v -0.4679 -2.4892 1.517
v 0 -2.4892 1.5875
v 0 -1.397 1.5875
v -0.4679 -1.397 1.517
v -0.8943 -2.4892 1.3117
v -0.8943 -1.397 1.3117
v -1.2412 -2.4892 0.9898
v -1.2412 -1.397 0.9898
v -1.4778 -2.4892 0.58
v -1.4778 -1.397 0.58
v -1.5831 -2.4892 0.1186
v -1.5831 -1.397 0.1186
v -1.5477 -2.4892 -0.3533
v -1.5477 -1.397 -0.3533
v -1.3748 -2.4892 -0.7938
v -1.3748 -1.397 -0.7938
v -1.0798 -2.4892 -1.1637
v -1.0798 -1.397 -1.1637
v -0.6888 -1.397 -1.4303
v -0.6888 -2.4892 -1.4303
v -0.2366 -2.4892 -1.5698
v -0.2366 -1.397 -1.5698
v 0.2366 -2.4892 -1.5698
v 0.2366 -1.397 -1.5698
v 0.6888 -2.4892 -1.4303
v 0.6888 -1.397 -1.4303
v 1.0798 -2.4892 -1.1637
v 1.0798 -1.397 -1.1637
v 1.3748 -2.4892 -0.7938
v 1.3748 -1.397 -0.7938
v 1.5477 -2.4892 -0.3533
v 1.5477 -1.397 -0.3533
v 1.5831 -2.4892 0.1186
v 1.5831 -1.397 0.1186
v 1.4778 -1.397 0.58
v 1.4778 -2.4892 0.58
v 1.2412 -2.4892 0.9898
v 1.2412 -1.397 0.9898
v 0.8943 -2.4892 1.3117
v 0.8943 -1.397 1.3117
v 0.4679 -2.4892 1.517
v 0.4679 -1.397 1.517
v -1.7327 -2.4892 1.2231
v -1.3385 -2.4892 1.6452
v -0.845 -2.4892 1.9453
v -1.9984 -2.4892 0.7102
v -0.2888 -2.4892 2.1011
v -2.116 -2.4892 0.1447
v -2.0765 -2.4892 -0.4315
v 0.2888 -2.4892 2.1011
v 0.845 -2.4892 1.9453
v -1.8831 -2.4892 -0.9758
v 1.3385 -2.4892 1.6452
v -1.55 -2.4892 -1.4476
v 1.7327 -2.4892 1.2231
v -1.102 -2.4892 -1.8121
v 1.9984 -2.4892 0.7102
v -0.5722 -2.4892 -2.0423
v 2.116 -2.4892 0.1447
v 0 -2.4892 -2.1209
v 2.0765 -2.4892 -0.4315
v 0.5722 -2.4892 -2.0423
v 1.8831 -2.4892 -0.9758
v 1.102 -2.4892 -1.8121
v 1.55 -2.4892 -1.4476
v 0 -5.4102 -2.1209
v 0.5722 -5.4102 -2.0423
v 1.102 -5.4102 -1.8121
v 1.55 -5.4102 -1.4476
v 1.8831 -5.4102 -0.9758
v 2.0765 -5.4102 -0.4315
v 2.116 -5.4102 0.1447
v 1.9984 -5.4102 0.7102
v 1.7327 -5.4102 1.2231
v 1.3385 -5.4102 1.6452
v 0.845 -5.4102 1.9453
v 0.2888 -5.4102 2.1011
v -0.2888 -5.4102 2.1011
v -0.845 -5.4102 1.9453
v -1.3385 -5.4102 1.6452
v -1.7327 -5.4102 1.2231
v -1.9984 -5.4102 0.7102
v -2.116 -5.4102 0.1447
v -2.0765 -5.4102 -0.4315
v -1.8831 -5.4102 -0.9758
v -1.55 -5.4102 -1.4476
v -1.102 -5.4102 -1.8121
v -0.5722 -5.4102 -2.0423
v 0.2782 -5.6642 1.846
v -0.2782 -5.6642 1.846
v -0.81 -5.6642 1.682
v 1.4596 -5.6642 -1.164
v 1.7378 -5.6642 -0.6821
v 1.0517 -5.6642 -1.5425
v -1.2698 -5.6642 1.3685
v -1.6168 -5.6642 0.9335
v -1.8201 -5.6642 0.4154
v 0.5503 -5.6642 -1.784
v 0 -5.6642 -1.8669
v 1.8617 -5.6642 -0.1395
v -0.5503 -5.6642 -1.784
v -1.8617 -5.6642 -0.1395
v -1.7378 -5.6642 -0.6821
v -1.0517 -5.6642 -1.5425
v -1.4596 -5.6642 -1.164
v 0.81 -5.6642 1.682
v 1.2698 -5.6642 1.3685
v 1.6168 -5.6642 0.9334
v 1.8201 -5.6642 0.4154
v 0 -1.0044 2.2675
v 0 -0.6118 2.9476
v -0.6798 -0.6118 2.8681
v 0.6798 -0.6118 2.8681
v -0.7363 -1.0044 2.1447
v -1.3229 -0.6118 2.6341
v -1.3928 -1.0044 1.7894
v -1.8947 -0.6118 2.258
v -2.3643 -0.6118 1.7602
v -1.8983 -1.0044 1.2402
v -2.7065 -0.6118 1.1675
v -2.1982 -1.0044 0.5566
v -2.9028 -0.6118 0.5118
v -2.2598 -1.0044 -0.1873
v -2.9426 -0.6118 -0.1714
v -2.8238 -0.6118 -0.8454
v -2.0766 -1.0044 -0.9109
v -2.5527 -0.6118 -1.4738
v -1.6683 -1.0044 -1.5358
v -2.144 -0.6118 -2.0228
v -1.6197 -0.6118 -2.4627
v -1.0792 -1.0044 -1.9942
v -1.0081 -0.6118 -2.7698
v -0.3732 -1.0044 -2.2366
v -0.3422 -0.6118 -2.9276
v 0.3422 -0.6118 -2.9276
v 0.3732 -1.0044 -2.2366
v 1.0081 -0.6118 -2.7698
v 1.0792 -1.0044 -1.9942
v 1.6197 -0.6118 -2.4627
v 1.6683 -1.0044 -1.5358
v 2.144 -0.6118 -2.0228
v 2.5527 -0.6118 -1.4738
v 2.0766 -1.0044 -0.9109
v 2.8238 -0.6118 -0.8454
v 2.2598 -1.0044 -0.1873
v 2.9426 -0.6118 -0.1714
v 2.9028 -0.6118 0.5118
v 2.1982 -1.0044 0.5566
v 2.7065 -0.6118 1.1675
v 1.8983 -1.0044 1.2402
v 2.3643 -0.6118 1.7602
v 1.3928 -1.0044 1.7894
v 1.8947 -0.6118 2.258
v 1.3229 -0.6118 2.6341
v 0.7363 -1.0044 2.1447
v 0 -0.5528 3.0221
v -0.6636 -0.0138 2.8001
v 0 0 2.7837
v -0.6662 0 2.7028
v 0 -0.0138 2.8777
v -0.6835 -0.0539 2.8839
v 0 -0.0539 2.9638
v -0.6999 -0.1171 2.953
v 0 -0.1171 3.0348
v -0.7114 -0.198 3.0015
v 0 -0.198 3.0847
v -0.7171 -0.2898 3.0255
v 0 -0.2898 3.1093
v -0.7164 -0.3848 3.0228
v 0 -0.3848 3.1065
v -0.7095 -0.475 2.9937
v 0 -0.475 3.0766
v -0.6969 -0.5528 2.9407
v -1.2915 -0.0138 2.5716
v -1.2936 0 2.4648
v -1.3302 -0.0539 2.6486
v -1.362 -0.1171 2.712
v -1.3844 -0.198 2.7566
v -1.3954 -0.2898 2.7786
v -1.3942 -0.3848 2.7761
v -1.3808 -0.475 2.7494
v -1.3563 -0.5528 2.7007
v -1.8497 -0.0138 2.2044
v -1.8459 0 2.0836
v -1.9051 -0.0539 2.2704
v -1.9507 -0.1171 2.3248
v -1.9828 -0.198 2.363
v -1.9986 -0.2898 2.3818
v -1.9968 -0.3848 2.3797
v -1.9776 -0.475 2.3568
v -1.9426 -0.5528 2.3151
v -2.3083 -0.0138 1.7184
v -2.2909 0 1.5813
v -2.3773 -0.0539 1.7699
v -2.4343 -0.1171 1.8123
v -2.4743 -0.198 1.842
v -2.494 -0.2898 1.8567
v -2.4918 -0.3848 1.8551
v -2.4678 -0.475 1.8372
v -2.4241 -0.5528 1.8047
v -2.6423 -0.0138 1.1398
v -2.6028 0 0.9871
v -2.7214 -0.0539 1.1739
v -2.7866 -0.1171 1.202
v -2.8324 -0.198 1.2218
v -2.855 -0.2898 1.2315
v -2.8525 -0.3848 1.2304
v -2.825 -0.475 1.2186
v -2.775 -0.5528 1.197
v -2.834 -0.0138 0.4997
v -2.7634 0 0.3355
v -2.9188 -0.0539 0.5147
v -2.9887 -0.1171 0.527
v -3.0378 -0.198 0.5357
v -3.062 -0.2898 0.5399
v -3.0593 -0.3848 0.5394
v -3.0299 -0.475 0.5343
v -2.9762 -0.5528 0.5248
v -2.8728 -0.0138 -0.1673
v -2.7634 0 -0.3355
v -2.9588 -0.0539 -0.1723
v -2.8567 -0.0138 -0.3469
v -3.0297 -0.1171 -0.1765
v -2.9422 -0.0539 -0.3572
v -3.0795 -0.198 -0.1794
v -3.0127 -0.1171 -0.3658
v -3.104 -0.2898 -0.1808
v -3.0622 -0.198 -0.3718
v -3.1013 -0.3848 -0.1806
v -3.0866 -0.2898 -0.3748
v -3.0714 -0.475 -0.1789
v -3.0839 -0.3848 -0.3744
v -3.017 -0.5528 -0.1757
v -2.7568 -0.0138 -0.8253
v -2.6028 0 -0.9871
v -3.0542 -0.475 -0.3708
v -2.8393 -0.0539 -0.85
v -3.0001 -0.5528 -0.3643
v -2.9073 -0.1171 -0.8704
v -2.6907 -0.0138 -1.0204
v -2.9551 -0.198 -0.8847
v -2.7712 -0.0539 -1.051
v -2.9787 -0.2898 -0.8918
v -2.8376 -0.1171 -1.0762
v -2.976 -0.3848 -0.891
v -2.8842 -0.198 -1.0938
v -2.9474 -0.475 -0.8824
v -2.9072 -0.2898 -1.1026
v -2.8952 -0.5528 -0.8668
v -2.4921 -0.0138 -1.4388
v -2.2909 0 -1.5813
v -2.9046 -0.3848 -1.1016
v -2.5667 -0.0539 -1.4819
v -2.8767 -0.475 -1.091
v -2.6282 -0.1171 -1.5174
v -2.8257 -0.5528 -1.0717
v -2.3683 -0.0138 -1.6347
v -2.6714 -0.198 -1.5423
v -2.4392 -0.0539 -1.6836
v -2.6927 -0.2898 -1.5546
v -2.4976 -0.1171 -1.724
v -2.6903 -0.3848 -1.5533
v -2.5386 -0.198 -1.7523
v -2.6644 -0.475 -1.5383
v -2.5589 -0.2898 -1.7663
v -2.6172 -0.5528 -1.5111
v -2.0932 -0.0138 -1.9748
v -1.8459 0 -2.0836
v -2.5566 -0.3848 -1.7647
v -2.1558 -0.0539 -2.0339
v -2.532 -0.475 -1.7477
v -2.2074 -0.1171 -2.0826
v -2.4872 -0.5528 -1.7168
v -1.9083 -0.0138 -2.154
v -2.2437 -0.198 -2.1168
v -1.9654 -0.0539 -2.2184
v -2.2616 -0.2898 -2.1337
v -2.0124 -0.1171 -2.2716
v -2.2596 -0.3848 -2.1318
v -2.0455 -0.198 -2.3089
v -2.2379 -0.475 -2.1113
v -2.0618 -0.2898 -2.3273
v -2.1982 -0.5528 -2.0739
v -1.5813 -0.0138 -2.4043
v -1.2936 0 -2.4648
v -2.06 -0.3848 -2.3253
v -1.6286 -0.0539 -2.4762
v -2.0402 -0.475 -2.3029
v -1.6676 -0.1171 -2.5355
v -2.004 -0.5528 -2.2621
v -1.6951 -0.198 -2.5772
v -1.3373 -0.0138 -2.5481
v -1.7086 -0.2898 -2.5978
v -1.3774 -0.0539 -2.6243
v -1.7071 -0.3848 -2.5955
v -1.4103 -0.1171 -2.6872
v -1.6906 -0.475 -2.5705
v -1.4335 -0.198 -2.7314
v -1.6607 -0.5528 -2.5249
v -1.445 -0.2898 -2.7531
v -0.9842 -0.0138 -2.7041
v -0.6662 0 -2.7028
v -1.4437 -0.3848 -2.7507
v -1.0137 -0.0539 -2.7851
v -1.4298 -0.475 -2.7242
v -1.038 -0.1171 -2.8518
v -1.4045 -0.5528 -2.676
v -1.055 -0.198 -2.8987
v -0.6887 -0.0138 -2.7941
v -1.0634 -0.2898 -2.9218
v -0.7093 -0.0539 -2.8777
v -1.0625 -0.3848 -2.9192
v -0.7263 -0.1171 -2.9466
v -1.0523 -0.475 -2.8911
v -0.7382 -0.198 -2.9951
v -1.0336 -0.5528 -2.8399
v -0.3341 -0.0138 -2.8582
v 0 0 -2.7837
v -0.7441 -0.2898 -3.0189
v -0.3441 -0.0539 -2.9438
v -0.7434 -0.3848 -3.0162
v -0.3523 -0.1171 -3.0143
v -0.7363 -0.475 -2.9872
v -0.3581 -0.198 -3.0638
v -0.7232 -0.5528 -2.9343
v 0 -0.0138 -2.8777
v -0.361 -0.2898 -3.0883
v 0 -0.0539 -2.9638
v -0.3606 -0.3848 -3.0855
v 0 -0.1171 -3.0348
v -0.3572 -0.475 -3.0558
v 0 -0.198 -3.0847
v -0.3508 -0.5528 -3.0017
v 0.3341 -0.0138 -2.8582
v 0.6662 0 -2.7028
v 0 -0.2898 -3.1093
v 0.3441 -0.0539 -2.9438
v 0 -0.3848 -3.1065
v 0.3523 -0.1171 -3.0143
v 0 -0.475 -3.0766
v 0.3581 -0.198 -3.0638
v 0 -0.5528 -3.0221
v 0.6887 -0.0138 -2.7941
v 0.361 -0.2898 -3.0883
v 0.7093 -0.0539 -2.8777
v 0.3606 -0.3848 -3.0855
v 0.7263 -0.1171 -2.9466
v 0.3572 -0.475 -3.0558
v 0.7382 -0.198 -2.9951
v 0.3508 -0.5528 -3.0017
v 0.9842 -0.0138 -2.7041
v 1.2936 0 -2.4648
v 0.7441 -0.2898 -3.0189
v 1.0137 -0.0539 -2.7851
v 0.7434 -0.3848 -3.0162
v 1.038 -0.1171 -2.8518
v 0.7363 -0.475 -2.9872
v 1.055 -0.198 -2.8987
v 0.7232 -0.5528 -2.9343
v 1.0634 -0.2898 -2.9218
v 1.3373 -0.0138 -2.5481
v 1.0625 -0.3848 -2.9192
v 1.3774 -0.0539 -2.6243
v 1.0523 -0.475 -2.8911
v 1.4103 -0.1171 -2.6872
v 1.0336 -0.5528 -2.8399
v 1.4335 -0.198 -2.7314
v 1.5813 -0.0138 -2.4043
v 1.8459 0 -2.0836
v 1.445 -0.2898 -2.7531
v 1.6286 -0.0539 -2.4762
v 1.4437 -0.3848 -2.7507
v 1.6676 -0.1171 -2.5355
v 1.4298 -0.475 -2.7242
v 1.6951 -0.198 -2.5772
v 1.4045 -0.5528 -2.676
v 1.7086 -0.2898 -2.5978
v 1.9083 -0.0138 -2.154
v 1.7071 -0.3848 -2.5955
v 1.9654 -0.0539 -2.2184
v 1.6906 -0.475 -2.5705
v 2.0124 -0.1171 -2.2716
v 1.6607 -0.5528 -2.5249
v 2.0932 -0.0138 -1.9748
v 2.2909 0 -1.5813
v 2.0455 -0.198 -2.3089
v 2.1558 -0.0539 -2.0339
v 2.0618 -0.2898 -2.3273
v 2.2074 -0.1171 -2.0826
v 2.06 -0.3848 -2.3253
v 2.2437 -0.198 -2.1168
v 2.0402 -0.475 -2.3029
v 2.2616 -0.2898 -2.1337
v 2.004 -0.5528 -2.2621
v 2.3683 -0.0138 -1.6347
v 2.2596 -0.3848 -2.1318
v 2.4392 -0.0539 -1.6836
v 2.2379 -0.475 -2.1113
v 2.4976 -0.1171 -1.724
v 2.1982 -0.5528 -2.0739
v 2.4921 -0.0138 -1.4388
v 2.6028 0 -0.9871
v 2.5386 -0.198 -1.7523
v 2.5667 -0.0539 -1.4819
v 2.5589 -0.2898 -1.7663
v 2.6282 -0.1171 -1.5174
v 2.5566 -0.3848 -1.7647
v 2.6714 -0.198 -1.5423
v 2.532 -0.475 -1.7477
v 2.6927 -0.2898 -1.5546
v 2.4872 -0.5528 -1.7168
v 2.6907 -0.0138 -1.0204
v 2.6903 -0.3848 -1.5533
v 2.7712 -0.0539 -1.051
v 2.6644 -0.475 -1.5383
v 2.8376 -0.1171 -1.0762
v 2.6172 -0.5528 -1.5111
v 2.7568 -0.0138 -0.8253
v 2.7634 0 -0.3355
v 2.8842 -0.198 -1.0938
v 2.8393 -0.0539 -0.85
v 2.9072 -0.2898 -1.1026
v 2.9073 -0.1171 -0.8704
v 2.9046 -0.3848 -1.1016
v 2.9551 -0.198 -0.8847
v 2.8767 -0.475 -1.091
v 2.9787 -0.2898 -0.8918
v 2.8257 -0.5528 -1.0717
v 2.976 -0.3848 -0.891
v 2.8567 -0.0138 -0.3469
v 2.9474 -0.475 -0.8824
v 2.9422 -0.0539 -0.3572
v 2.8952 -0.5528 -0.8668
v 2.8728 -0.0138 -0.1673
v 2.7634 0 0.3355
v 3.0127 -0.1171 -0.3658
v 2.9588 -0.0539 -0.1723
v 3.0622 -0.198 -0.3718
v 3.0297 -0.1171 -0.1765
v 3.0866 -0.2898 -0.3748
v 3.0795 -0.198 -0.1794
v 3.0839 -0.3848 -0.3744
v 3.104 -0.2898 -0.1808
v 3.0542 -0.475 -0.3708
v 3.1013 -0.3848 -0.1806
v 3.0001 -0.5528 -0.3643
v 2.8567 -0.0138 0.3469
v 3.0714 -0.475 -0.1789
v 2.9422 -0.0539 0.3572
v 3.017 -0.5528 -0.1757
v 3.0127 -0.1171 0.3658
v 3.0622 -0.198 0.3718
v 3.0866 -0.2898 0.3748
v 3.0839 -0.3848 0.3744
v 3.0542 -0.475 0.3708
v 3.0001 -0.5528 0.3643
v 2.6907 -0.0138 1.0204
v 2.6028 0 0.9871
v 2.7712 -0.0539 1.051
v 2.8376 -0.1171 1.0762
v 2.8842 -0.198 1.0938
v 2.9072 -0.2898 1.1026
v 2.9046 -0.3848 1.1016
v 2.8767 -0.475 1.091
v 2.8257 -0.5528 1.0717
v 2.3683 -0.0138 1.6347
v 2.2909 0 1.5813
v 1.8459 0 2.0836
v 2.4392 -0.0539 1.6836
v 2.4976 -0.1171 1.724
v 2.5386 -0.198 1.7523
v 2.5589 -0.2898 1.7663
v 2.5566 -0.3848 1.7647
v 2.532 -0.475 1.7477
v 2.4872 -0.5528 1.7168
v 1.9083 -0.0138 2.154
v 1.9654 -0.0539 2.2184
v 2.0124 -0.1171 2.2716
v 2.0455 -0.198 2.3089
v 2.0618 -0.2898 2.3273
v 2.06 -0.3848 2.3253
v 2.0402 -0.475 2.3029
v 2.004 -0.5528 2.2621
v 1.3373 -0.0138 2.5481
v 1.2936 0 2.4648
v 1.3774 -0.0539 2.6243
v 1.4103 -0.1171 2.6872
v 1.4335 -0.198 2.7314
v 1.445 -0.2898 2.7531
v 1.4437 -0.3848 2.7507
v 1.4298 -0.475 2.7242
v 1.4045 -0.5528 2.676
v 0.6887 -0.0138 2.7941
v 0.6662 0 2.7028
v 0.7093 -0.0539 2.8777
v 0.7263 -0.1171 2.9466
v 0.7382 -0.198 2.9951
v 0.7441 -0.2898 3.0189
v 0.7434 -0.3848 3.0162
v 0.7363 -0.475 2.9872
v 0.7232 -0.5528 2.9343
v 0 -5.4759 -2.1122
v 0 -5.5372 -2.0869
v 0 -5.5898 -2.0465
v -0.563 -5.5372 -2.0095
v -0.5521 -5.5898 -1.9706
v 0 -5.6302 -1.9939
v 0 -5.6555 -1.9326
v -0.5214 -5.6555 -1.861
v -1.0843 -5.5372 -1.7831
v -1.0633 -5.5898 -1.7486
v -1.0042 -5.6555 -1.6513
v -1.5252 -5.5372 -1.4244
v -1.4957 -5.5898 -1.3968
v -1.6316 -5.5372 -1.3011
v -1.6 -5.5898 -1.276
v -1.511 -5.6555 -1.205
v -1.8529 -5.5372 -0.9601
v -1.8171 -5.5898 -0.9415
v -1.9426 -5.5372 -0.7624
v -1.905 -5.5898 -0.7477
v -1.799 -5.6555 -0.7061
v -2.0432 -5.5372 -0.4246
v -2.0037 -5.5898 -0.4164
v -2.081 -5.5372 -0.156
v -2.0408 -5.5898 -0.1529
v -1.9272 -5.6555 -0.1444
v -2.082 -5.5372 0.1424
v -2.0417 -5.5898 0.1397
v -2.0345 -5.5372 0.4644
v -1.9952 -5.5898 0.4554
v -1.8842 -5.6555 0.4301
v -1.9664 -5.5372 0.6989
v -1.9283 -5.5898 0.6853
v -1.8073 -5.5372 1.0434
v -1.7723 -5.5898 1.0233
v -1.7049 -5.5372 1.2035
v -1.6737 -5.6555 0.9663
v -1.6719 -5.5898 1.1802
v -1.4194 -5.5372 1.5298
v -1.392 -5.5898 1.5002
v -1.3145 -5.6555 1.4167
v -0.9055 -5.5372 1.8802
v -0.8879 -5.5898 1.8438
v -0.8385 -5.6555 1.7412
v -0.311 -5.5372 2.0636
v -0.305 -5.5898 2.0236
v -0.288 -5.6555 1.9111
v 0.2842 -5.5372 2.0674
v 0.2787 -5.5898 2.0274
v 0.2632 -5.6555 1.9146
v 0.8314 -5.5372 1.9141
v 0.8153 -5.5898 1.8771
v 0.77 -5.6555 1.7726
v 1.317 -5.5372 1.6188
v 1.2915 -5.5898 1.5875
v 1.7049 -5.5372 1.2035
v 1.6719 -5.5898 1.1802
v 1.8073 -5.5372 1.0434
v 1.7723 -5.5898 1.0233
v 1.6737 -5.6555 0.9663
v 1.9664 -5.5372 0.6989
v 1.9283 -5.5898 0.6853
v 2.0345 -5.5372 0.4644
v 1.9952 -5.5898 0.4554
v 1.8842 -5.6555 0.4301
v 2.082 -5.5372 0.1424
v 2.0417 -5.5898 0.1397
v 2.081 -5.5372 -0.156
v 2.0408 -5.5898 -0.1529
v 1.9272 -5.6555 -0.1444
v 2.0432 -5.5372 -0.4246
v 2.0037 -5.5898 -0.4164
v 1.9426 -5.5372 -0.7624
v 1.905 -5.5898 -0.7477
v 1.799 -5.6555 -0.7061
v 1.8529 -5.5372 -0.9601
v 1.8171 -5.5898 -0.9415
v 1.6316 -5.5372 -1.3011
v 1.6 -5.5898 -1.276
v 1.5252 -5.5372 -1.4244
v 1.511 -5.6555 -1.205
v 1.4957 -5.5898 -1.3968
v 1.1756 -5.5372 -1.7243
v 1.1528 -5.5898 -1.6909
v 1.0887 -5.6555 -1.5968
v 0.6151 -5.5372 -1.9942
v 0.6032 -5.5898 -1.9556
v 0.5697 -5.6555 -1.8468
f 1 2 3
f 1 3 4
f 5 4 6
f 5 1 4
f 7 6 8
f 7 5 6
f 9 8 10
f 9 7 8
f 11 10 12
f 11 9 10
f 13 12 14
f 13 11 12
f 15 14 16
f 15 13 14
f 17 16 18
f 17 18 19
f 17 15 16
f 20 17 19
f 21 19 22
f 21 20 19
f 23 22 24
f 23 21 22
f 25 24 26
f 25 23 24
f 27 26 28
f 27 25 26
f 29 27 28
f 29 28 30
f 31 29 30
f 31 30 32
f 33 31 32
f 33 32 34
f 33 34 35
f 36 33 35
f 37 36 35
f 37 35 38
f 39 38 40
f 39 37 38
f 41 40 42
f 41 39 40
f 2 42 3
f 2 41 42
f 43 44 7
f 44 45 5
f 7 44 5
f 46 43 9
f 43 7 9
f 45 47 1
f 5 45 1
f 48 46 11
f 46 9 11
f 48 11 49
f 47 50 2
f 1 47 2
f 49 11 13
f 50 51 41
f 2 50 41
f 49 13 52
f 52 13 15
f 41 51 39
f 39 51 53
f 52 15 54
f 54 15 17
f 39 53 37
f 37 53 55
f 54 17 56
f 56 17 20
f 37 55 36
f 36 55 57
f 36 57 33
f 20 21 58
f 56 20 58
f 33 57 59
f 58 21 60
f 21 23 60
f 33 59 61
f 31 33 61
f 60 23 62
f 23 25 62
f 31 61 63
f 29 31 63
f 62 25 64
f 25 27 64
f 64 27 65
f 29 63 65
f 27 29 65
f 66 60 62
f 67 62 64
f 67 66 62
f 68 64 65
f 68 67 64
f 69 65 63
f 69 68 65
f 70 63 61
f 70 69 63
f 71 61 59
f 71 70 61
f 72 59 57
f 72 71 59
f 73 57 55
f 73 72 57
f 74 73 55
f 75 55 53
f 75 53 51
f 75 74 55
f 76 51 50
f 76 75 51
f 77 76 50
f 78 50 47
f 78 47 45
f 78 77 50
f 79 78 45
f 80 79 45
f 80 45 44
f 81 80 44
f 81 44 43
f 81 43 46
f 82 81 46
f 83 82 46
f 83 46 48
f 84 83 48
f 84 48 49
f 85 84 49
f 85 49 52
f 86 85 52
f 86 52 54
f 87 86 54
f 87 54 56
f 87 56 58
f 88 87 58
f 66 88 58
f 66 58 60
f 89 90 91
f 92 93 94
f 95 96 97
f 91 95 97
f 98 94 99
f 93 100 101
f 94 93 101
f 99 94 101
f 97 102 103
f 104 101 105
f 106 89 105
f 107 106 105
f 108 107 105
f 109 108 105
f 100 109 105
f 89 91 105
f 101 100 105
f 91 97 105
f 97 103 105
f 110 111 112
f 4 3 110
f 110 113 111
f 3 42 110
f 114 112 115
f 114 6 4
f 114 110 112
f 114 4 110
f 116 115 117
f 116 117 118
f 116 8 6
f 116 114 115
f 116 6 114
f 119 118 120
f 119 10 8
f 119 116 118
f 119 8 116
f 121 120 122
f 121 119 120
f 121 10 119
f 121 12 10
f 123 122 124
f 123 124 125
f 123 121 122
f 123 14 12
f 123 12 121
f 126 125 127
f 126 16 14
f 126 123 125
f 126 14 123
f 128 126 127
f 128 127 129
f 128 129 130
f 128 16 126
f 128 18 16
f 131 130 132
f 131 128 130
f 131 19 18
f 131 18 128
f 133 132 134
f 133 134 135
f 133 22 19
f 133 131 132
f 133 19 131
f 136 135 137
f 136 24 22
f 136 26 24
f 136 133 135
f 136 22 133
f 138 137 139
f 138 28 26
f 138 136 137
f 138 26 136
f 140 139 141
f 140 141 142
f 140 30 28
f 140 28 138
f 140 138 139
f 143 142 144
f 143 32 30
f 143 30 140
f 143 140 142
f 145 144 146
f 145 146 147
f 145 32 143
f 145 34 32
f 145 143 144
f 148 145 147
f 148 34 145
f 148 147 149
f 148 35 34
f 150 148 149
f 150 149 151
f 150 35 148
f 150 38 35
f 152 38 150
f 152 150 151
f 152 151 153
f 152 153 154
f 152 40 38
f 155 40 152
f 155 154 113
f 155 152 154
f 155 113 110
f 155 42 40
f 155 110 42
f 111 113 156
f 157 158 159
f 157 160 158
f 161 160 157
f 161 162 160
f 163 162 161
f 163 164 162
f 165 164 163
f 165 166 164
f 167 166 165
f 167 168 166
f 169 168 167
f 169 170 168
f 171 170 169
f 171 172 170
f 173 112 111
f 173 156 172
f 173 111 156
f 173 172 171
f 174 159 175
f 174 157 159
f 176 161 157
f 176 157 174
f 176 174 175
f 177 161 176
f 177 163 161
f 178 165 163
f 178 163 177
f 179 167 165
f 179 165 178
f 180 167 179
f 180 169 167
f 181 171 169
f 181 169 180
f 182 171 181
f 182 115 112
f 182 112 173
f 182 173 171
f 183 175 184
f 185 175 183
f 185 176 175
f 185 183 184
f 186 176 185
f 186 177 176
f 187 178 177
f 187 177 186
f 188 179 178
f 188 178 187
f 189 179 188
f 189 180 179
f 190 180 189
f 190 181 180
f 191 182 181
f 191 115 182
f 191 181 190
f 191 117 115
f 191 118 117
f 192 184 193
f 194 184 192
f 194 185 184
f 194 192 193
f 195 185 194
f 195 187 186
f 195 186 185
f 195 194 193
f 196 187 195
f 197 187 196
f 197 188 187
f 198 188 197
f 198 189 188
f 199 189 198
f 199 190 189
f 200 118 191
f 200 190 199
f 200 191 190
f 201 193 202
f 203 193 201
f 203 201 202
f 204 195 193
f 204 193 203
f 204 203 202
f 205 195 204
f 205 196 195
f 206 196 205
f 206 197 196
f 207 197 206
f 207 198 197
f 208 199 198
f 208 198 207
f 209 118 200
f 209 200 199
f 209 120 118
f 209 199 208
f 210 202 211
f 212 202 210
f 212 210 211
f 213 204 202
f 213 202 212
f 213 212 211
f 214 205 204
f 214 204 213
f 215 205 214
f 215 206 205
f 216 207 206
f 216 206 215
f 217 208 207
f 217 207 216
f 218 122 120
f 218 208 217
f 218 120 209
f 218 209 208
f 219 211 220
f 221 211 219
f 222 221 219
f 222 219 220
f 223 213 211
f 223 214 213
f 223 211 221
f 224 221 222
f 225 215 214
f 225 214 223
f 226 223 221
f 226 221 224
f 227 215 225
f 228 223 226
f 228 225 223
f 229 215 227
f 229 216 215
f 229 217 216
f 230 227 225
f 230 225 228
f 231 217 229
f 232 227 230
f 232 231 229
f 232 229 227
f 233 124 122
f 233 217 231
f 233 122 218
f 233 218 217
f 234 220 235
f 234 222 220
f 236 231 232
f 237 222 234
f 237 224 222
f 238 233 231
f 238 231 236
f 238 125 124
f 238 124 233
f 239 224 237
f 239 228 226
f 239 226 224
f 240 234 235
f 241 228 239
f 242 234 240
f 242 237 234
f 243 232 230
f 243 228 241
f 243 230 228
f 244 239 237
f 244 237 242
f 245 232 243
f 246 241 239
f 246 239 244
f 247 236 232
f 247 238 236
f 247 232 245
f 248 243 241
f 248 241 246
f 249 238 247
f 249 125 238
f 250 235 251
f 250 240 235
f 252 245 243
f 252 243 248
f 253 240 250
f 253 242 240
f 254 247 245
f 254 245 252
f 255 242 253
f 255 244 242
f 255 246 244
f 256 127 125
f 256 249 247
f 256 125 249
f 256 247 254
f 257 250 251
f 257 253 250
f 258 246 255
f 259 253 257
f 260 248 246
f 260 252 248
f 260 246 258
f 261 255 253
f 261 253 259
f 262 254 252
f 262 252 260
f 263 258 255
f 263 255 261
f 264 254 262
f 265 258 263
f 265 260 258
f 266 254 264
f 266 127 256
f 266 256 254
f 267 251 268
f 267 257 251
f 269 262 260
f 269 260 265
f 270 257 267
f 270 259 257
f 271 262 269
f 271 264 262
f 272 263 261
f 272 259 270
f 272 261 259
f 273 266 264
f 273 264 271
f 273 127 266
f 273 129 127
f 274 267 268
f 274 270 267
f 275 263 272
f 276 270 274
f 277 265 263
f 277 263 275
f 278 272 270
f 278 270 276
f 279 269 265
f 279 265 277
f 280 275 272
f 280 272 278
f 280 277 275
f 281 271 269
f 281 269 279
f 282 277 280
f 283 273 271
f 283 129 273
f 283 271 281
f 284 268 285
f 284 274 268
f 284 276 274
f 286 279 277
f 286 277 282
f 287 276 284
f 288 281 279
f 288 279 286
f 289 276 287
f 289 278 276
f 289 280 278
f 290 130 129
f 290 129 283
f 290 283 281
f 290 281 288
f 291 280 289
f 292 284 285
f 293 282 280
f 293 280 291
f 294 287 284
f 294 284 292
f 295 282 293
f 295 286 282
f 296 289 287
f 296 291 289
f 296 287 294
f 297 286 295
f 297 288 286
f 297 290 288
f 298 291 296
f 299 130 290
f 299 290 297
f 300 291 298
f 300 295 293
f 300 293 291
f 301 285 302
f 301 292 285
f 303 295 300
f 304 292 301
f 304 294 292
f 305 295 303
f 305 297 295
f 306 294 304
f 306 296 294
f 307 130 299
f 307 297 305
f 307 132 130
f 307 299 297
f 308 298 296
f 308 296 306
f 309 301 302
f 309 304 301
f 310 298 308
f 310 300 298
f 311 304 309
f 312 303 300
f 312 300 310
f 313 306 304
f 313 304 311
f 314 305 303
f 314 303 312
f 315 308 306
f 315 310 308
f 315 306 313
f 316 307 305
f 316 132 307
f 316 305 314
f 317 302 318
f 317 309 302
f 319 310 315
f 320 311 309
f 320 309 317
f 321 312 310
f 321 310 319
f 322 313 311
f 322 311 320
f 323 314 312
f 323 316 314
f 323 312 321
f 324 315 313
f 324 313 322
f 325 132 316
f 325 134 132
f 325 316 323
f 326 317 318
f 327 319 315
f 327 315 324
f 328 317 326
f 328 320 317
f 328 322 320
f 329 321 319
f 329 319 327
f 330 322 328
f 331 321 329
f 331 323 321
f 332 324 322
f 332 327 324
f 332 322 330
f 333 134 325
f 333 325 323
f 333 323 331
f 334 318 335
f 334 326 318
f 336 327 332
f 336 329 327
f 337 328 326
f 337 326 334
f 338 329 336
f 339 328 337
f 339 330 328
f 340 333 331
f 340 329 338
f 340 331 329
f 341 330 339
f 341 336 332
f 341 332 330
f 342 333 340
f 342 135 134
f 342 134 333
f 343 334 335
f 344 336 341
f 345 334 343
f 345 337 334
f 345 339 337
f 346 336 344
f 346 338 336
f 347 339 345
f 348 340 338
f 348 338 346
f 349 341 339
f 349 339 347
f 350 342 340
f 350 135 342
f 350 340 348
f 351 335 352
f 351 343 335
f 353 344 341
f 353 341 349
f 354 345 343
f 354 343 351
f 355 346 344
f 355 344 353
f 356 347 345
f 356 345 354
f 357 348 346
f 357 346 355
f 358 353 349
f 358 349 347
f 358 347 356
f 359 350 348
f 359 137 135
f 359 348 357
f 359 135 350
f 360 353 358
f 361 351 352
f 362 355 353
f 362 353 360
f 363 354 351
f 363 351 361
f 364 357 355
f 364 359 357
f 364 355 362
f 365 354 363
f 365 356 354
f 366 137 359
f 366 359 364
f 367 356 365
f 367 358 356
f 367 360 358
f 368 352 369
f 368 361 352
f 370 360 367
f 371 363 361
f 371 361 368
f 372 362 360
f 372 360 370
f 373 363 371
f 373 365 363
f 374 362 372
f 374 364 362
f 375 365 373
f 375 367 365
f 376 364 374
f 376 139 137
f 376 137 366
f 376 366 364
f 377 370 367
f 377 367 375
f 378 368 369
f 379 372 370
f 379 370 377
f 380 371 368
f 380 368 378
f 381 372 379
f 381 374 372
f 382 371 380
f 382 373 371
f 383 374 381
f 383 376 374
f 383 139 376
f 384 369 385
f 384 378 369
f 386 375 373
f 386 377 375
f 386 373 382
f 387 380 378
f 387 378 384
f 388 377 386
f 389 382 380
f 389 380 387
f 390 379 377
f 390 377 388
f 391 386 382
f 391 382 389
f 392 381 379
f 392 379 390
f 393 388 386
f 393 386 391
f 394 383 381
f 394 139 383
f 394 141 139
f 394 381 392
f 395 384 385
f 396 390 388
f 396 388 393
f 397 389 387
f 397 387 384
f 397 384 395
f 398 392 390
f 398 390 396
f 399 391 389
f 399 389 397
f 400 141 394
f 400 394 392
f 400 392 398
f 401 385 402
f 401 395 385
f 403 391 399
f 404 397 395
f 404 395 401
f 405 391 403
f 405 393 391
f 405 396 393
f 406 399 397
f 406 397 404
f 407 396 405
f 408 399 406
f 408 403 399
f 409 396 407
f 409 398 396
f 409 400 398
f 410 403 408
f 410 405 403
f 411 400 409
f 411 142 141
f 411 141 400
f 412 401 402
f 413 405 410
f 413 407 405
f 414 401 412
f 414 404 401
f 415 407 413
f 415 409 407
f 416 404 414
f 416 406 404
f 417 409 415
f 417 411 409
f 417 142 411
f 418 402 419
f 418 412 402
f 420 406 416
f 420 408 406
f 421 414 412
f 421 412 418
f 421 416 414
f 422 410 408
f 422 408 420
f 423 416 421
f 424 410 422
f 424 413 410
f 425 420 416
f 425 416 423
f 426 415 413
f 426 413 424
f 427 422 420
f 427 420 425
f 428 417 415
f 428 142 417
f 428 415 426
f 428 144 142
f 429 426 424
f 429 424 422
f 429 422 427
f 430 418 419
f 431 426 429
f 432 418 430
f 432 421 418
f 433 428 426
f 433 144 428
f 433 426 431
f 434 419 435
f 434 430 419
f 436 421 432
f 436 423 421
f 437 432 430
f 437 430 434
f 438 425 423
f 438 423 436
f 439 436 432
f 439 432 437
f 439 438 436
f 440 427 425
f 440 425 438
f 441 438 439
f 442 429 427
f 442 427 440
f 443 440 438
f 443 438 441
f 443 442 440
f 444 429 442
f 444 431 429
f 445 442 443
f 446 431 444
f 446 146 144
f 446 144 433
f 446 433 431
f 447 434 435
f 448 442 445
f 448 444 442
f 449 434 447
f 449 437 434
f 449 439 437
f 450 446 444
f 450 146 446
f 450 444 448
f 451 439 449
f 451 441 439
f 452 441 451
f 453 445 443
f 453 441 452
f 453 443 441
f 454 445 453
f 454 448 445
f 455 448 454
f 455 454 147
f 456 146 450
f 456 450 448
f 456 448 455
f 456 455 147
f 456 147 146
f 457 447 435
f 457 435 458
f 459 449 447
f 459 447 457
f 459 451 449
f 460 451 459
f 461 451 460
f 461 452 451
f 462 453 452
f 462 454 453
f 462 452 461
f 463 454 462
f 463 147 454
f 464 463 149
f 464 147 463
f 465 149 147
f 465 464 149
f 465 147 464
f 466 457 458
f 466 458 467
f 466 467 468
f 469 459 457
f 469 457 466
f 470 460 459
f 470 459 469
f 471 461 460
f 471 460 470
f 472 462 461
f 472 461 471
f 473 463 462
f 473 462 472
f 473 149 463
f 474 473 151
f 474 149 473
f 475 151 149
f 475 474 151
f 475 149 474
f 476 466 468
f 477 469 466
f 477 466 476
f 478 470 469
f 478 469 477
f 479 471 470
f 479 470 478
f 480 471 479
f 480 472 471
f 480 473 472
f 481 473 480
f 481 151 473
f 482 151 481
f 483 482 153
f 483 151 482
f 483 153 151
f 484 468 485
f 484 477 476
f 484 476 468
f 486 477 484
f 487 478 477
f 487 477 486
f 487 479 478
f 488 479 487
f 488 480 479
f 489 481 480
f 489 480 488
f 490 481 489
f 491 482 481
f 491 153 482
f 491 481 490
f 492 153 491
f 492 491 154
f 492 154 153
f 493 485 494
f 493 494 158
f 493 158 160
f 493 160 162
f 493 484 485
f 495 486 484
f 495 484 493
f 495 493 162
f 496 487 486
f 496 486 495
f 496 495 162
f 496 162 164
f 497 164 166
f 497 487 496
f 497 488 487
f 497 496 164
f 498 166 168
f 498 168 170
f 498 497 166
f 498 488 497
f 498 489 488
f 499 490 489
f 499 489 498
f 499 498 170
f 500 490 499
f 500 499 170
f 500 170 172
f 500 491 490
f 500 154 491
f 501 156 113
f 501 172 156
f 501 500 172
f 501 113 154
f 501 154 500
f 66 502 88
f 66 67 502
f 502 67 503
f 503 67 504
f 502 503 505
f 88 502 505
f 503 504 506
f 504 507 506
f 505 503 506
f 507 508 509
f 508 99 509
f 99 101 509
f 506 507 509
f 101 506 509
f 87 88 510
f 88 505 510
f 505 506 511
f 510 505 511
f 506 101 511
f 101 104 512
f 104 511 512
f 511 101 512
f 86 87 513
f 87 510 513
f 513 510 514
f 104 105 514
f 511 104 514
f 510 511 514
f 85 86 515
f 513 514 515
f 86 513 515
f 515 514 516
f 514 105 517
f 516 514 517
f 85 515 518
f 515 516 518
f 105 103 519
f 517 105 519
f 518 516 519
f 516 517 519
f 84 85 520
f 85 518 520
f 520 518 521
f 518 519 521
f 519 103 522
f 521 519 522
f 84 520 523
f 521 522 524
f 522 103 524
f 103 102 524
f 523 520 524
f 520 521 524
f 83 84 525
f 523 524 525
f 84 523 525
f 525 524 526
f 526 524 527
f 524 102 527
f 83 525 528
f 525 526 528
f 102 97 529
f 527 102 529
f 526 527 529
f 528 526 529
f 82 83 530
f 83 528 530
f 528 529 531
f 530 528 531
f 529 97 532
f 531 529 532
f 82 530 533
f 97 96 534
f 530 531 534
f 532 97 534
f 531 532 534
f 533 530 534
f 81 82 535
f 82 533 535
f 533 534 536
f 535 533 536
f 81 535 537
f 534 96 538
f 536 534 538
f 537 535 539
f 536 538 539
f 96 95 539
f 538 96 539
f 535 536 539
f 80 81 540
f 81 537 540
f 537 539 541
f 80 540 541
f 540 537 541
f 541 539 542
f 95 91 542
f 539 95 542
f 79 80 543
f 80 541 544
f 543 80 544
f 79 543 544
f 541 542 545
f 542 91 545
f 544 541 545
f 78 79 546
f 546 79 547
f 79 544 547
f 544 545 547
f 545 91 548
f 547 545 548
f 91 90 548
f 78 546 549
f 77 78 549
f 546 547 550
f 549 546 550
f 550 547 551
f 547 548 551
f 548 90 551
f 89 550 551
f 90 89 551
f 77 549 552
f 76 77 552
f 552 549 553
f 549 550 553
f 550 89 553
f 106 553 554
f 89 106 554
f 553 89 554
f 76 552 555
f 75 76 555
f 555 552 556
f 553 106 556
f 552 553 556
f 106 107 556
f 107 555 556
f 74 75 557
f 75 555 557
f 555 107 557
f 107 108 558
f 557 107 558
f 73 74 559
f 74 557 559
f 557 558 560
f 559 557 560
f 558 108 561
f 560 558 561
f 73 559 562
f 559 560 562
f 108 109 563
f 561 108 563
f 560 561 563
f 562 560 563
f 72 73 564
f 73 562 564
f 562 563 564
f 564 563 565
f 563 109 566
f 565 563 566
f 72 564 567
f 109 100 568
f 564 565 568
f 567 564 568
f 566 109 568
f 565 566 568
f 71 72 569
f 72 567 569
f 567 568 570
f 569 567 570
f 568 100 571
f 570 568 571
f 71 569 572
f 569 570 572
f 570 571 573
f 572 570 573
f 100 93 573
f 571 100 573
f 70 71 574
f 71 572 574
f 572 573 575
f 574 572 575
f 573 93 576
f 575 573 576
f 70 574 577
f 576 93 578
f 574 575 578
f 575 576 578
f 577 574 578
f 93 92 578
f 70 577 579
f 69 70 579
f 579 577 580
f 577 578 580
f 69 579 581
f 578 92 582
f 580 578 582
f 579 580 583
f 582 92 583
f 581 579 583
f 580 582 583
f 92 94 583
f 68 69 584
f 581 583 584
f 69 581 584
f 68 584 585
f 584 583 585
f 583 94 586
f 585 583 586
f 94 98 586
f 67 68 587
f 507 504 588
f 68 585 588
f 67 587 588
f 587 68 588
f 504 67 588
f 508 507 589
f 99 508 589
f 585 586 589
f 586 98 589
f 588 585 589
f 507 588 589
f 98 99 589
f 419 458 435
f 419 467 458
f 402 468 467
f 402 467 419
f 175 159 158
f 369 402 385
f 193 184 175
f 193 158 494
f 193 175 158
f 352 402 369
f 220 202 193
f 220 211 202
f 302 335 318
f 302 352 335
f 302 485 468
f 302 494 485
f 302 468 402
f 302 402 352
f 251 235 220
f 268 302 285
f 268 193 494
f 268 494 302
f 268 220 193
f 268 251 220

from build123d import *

# Parameters (mm, degrees)
SKETCH3_R           = 2.1209
BOSS_EXTRUDE1_DEPTH = 7.5692
CUT_EXTRUDE1_START  = -11.811
SKETCH5_R           = 2.1209
CUT_EXTRUDE1_DEPTH  = 8.636
FILLET1_R           = 0.254


with BuildPart() as part:
    # Sketch2 → Revolve1 (revolve)
    with BuildSketch(Plane.XY, mode=Mode.PRIVATE) as revolve1_sk:
        with BuildLine():
            Line((1.5875, -1.397), (1.5875, -10.0584))
            Line((1.5875, -10.0584), (0, -10.0584))
            Line((0, -10.0584), (0, 0))
            Line((0, 0), (2.783660204, 0))
            ThreePointArc((2.783660204, 0), (3.10032913, -0.242988613), (2.947580102, -0.611757387))
            Line((2.947580102, -0.611757387), (1.5875, -1.397))
        make_face()
    revolve(revolve1_sk.sketch.rotate(Axis((0, 94.608881441, 0), (0, -1, 0)), 90), axis=Axis((0, 94.608881441, 0), (0, -1, 0)))

    # Sketch3 → Boss-Extrude1 (add)
    with BuildSketch(Plane.XZ.offset(10.0584)):
        with Locations(Location((0, 0, 0), (0, 0, 270))):
            Circle(SKETCH3_R)
    extrude(amount=-BOSS_EXTRUDE1_DEPTH)

    # Sketch5 → Cut-Extrude1 (cut)
    with BuildSketch(Plane(origin=(0, -2.4892, 0), x_dir=(1, 0, 0), z_dir=(0, 1, 0)).offset(CUT_EXTRUDE1_START)):
        with Locations(Location((0, 0, 0), (0, 0, 90))):
            Circle(SKETCH5_R)
    extrude(amount=CUT_EXTRUDE1_DEPTH, mode=Mode.SUBTRACT)

    # Fillet1
    fillet1_edges = [part.edges().sort_by_distance(p)[0] for p in [
        (0, -5.6642, 2.1209),
    ]]
    fillet(fillet1_edges, radius=FILLET1_R)


solid = part.part
